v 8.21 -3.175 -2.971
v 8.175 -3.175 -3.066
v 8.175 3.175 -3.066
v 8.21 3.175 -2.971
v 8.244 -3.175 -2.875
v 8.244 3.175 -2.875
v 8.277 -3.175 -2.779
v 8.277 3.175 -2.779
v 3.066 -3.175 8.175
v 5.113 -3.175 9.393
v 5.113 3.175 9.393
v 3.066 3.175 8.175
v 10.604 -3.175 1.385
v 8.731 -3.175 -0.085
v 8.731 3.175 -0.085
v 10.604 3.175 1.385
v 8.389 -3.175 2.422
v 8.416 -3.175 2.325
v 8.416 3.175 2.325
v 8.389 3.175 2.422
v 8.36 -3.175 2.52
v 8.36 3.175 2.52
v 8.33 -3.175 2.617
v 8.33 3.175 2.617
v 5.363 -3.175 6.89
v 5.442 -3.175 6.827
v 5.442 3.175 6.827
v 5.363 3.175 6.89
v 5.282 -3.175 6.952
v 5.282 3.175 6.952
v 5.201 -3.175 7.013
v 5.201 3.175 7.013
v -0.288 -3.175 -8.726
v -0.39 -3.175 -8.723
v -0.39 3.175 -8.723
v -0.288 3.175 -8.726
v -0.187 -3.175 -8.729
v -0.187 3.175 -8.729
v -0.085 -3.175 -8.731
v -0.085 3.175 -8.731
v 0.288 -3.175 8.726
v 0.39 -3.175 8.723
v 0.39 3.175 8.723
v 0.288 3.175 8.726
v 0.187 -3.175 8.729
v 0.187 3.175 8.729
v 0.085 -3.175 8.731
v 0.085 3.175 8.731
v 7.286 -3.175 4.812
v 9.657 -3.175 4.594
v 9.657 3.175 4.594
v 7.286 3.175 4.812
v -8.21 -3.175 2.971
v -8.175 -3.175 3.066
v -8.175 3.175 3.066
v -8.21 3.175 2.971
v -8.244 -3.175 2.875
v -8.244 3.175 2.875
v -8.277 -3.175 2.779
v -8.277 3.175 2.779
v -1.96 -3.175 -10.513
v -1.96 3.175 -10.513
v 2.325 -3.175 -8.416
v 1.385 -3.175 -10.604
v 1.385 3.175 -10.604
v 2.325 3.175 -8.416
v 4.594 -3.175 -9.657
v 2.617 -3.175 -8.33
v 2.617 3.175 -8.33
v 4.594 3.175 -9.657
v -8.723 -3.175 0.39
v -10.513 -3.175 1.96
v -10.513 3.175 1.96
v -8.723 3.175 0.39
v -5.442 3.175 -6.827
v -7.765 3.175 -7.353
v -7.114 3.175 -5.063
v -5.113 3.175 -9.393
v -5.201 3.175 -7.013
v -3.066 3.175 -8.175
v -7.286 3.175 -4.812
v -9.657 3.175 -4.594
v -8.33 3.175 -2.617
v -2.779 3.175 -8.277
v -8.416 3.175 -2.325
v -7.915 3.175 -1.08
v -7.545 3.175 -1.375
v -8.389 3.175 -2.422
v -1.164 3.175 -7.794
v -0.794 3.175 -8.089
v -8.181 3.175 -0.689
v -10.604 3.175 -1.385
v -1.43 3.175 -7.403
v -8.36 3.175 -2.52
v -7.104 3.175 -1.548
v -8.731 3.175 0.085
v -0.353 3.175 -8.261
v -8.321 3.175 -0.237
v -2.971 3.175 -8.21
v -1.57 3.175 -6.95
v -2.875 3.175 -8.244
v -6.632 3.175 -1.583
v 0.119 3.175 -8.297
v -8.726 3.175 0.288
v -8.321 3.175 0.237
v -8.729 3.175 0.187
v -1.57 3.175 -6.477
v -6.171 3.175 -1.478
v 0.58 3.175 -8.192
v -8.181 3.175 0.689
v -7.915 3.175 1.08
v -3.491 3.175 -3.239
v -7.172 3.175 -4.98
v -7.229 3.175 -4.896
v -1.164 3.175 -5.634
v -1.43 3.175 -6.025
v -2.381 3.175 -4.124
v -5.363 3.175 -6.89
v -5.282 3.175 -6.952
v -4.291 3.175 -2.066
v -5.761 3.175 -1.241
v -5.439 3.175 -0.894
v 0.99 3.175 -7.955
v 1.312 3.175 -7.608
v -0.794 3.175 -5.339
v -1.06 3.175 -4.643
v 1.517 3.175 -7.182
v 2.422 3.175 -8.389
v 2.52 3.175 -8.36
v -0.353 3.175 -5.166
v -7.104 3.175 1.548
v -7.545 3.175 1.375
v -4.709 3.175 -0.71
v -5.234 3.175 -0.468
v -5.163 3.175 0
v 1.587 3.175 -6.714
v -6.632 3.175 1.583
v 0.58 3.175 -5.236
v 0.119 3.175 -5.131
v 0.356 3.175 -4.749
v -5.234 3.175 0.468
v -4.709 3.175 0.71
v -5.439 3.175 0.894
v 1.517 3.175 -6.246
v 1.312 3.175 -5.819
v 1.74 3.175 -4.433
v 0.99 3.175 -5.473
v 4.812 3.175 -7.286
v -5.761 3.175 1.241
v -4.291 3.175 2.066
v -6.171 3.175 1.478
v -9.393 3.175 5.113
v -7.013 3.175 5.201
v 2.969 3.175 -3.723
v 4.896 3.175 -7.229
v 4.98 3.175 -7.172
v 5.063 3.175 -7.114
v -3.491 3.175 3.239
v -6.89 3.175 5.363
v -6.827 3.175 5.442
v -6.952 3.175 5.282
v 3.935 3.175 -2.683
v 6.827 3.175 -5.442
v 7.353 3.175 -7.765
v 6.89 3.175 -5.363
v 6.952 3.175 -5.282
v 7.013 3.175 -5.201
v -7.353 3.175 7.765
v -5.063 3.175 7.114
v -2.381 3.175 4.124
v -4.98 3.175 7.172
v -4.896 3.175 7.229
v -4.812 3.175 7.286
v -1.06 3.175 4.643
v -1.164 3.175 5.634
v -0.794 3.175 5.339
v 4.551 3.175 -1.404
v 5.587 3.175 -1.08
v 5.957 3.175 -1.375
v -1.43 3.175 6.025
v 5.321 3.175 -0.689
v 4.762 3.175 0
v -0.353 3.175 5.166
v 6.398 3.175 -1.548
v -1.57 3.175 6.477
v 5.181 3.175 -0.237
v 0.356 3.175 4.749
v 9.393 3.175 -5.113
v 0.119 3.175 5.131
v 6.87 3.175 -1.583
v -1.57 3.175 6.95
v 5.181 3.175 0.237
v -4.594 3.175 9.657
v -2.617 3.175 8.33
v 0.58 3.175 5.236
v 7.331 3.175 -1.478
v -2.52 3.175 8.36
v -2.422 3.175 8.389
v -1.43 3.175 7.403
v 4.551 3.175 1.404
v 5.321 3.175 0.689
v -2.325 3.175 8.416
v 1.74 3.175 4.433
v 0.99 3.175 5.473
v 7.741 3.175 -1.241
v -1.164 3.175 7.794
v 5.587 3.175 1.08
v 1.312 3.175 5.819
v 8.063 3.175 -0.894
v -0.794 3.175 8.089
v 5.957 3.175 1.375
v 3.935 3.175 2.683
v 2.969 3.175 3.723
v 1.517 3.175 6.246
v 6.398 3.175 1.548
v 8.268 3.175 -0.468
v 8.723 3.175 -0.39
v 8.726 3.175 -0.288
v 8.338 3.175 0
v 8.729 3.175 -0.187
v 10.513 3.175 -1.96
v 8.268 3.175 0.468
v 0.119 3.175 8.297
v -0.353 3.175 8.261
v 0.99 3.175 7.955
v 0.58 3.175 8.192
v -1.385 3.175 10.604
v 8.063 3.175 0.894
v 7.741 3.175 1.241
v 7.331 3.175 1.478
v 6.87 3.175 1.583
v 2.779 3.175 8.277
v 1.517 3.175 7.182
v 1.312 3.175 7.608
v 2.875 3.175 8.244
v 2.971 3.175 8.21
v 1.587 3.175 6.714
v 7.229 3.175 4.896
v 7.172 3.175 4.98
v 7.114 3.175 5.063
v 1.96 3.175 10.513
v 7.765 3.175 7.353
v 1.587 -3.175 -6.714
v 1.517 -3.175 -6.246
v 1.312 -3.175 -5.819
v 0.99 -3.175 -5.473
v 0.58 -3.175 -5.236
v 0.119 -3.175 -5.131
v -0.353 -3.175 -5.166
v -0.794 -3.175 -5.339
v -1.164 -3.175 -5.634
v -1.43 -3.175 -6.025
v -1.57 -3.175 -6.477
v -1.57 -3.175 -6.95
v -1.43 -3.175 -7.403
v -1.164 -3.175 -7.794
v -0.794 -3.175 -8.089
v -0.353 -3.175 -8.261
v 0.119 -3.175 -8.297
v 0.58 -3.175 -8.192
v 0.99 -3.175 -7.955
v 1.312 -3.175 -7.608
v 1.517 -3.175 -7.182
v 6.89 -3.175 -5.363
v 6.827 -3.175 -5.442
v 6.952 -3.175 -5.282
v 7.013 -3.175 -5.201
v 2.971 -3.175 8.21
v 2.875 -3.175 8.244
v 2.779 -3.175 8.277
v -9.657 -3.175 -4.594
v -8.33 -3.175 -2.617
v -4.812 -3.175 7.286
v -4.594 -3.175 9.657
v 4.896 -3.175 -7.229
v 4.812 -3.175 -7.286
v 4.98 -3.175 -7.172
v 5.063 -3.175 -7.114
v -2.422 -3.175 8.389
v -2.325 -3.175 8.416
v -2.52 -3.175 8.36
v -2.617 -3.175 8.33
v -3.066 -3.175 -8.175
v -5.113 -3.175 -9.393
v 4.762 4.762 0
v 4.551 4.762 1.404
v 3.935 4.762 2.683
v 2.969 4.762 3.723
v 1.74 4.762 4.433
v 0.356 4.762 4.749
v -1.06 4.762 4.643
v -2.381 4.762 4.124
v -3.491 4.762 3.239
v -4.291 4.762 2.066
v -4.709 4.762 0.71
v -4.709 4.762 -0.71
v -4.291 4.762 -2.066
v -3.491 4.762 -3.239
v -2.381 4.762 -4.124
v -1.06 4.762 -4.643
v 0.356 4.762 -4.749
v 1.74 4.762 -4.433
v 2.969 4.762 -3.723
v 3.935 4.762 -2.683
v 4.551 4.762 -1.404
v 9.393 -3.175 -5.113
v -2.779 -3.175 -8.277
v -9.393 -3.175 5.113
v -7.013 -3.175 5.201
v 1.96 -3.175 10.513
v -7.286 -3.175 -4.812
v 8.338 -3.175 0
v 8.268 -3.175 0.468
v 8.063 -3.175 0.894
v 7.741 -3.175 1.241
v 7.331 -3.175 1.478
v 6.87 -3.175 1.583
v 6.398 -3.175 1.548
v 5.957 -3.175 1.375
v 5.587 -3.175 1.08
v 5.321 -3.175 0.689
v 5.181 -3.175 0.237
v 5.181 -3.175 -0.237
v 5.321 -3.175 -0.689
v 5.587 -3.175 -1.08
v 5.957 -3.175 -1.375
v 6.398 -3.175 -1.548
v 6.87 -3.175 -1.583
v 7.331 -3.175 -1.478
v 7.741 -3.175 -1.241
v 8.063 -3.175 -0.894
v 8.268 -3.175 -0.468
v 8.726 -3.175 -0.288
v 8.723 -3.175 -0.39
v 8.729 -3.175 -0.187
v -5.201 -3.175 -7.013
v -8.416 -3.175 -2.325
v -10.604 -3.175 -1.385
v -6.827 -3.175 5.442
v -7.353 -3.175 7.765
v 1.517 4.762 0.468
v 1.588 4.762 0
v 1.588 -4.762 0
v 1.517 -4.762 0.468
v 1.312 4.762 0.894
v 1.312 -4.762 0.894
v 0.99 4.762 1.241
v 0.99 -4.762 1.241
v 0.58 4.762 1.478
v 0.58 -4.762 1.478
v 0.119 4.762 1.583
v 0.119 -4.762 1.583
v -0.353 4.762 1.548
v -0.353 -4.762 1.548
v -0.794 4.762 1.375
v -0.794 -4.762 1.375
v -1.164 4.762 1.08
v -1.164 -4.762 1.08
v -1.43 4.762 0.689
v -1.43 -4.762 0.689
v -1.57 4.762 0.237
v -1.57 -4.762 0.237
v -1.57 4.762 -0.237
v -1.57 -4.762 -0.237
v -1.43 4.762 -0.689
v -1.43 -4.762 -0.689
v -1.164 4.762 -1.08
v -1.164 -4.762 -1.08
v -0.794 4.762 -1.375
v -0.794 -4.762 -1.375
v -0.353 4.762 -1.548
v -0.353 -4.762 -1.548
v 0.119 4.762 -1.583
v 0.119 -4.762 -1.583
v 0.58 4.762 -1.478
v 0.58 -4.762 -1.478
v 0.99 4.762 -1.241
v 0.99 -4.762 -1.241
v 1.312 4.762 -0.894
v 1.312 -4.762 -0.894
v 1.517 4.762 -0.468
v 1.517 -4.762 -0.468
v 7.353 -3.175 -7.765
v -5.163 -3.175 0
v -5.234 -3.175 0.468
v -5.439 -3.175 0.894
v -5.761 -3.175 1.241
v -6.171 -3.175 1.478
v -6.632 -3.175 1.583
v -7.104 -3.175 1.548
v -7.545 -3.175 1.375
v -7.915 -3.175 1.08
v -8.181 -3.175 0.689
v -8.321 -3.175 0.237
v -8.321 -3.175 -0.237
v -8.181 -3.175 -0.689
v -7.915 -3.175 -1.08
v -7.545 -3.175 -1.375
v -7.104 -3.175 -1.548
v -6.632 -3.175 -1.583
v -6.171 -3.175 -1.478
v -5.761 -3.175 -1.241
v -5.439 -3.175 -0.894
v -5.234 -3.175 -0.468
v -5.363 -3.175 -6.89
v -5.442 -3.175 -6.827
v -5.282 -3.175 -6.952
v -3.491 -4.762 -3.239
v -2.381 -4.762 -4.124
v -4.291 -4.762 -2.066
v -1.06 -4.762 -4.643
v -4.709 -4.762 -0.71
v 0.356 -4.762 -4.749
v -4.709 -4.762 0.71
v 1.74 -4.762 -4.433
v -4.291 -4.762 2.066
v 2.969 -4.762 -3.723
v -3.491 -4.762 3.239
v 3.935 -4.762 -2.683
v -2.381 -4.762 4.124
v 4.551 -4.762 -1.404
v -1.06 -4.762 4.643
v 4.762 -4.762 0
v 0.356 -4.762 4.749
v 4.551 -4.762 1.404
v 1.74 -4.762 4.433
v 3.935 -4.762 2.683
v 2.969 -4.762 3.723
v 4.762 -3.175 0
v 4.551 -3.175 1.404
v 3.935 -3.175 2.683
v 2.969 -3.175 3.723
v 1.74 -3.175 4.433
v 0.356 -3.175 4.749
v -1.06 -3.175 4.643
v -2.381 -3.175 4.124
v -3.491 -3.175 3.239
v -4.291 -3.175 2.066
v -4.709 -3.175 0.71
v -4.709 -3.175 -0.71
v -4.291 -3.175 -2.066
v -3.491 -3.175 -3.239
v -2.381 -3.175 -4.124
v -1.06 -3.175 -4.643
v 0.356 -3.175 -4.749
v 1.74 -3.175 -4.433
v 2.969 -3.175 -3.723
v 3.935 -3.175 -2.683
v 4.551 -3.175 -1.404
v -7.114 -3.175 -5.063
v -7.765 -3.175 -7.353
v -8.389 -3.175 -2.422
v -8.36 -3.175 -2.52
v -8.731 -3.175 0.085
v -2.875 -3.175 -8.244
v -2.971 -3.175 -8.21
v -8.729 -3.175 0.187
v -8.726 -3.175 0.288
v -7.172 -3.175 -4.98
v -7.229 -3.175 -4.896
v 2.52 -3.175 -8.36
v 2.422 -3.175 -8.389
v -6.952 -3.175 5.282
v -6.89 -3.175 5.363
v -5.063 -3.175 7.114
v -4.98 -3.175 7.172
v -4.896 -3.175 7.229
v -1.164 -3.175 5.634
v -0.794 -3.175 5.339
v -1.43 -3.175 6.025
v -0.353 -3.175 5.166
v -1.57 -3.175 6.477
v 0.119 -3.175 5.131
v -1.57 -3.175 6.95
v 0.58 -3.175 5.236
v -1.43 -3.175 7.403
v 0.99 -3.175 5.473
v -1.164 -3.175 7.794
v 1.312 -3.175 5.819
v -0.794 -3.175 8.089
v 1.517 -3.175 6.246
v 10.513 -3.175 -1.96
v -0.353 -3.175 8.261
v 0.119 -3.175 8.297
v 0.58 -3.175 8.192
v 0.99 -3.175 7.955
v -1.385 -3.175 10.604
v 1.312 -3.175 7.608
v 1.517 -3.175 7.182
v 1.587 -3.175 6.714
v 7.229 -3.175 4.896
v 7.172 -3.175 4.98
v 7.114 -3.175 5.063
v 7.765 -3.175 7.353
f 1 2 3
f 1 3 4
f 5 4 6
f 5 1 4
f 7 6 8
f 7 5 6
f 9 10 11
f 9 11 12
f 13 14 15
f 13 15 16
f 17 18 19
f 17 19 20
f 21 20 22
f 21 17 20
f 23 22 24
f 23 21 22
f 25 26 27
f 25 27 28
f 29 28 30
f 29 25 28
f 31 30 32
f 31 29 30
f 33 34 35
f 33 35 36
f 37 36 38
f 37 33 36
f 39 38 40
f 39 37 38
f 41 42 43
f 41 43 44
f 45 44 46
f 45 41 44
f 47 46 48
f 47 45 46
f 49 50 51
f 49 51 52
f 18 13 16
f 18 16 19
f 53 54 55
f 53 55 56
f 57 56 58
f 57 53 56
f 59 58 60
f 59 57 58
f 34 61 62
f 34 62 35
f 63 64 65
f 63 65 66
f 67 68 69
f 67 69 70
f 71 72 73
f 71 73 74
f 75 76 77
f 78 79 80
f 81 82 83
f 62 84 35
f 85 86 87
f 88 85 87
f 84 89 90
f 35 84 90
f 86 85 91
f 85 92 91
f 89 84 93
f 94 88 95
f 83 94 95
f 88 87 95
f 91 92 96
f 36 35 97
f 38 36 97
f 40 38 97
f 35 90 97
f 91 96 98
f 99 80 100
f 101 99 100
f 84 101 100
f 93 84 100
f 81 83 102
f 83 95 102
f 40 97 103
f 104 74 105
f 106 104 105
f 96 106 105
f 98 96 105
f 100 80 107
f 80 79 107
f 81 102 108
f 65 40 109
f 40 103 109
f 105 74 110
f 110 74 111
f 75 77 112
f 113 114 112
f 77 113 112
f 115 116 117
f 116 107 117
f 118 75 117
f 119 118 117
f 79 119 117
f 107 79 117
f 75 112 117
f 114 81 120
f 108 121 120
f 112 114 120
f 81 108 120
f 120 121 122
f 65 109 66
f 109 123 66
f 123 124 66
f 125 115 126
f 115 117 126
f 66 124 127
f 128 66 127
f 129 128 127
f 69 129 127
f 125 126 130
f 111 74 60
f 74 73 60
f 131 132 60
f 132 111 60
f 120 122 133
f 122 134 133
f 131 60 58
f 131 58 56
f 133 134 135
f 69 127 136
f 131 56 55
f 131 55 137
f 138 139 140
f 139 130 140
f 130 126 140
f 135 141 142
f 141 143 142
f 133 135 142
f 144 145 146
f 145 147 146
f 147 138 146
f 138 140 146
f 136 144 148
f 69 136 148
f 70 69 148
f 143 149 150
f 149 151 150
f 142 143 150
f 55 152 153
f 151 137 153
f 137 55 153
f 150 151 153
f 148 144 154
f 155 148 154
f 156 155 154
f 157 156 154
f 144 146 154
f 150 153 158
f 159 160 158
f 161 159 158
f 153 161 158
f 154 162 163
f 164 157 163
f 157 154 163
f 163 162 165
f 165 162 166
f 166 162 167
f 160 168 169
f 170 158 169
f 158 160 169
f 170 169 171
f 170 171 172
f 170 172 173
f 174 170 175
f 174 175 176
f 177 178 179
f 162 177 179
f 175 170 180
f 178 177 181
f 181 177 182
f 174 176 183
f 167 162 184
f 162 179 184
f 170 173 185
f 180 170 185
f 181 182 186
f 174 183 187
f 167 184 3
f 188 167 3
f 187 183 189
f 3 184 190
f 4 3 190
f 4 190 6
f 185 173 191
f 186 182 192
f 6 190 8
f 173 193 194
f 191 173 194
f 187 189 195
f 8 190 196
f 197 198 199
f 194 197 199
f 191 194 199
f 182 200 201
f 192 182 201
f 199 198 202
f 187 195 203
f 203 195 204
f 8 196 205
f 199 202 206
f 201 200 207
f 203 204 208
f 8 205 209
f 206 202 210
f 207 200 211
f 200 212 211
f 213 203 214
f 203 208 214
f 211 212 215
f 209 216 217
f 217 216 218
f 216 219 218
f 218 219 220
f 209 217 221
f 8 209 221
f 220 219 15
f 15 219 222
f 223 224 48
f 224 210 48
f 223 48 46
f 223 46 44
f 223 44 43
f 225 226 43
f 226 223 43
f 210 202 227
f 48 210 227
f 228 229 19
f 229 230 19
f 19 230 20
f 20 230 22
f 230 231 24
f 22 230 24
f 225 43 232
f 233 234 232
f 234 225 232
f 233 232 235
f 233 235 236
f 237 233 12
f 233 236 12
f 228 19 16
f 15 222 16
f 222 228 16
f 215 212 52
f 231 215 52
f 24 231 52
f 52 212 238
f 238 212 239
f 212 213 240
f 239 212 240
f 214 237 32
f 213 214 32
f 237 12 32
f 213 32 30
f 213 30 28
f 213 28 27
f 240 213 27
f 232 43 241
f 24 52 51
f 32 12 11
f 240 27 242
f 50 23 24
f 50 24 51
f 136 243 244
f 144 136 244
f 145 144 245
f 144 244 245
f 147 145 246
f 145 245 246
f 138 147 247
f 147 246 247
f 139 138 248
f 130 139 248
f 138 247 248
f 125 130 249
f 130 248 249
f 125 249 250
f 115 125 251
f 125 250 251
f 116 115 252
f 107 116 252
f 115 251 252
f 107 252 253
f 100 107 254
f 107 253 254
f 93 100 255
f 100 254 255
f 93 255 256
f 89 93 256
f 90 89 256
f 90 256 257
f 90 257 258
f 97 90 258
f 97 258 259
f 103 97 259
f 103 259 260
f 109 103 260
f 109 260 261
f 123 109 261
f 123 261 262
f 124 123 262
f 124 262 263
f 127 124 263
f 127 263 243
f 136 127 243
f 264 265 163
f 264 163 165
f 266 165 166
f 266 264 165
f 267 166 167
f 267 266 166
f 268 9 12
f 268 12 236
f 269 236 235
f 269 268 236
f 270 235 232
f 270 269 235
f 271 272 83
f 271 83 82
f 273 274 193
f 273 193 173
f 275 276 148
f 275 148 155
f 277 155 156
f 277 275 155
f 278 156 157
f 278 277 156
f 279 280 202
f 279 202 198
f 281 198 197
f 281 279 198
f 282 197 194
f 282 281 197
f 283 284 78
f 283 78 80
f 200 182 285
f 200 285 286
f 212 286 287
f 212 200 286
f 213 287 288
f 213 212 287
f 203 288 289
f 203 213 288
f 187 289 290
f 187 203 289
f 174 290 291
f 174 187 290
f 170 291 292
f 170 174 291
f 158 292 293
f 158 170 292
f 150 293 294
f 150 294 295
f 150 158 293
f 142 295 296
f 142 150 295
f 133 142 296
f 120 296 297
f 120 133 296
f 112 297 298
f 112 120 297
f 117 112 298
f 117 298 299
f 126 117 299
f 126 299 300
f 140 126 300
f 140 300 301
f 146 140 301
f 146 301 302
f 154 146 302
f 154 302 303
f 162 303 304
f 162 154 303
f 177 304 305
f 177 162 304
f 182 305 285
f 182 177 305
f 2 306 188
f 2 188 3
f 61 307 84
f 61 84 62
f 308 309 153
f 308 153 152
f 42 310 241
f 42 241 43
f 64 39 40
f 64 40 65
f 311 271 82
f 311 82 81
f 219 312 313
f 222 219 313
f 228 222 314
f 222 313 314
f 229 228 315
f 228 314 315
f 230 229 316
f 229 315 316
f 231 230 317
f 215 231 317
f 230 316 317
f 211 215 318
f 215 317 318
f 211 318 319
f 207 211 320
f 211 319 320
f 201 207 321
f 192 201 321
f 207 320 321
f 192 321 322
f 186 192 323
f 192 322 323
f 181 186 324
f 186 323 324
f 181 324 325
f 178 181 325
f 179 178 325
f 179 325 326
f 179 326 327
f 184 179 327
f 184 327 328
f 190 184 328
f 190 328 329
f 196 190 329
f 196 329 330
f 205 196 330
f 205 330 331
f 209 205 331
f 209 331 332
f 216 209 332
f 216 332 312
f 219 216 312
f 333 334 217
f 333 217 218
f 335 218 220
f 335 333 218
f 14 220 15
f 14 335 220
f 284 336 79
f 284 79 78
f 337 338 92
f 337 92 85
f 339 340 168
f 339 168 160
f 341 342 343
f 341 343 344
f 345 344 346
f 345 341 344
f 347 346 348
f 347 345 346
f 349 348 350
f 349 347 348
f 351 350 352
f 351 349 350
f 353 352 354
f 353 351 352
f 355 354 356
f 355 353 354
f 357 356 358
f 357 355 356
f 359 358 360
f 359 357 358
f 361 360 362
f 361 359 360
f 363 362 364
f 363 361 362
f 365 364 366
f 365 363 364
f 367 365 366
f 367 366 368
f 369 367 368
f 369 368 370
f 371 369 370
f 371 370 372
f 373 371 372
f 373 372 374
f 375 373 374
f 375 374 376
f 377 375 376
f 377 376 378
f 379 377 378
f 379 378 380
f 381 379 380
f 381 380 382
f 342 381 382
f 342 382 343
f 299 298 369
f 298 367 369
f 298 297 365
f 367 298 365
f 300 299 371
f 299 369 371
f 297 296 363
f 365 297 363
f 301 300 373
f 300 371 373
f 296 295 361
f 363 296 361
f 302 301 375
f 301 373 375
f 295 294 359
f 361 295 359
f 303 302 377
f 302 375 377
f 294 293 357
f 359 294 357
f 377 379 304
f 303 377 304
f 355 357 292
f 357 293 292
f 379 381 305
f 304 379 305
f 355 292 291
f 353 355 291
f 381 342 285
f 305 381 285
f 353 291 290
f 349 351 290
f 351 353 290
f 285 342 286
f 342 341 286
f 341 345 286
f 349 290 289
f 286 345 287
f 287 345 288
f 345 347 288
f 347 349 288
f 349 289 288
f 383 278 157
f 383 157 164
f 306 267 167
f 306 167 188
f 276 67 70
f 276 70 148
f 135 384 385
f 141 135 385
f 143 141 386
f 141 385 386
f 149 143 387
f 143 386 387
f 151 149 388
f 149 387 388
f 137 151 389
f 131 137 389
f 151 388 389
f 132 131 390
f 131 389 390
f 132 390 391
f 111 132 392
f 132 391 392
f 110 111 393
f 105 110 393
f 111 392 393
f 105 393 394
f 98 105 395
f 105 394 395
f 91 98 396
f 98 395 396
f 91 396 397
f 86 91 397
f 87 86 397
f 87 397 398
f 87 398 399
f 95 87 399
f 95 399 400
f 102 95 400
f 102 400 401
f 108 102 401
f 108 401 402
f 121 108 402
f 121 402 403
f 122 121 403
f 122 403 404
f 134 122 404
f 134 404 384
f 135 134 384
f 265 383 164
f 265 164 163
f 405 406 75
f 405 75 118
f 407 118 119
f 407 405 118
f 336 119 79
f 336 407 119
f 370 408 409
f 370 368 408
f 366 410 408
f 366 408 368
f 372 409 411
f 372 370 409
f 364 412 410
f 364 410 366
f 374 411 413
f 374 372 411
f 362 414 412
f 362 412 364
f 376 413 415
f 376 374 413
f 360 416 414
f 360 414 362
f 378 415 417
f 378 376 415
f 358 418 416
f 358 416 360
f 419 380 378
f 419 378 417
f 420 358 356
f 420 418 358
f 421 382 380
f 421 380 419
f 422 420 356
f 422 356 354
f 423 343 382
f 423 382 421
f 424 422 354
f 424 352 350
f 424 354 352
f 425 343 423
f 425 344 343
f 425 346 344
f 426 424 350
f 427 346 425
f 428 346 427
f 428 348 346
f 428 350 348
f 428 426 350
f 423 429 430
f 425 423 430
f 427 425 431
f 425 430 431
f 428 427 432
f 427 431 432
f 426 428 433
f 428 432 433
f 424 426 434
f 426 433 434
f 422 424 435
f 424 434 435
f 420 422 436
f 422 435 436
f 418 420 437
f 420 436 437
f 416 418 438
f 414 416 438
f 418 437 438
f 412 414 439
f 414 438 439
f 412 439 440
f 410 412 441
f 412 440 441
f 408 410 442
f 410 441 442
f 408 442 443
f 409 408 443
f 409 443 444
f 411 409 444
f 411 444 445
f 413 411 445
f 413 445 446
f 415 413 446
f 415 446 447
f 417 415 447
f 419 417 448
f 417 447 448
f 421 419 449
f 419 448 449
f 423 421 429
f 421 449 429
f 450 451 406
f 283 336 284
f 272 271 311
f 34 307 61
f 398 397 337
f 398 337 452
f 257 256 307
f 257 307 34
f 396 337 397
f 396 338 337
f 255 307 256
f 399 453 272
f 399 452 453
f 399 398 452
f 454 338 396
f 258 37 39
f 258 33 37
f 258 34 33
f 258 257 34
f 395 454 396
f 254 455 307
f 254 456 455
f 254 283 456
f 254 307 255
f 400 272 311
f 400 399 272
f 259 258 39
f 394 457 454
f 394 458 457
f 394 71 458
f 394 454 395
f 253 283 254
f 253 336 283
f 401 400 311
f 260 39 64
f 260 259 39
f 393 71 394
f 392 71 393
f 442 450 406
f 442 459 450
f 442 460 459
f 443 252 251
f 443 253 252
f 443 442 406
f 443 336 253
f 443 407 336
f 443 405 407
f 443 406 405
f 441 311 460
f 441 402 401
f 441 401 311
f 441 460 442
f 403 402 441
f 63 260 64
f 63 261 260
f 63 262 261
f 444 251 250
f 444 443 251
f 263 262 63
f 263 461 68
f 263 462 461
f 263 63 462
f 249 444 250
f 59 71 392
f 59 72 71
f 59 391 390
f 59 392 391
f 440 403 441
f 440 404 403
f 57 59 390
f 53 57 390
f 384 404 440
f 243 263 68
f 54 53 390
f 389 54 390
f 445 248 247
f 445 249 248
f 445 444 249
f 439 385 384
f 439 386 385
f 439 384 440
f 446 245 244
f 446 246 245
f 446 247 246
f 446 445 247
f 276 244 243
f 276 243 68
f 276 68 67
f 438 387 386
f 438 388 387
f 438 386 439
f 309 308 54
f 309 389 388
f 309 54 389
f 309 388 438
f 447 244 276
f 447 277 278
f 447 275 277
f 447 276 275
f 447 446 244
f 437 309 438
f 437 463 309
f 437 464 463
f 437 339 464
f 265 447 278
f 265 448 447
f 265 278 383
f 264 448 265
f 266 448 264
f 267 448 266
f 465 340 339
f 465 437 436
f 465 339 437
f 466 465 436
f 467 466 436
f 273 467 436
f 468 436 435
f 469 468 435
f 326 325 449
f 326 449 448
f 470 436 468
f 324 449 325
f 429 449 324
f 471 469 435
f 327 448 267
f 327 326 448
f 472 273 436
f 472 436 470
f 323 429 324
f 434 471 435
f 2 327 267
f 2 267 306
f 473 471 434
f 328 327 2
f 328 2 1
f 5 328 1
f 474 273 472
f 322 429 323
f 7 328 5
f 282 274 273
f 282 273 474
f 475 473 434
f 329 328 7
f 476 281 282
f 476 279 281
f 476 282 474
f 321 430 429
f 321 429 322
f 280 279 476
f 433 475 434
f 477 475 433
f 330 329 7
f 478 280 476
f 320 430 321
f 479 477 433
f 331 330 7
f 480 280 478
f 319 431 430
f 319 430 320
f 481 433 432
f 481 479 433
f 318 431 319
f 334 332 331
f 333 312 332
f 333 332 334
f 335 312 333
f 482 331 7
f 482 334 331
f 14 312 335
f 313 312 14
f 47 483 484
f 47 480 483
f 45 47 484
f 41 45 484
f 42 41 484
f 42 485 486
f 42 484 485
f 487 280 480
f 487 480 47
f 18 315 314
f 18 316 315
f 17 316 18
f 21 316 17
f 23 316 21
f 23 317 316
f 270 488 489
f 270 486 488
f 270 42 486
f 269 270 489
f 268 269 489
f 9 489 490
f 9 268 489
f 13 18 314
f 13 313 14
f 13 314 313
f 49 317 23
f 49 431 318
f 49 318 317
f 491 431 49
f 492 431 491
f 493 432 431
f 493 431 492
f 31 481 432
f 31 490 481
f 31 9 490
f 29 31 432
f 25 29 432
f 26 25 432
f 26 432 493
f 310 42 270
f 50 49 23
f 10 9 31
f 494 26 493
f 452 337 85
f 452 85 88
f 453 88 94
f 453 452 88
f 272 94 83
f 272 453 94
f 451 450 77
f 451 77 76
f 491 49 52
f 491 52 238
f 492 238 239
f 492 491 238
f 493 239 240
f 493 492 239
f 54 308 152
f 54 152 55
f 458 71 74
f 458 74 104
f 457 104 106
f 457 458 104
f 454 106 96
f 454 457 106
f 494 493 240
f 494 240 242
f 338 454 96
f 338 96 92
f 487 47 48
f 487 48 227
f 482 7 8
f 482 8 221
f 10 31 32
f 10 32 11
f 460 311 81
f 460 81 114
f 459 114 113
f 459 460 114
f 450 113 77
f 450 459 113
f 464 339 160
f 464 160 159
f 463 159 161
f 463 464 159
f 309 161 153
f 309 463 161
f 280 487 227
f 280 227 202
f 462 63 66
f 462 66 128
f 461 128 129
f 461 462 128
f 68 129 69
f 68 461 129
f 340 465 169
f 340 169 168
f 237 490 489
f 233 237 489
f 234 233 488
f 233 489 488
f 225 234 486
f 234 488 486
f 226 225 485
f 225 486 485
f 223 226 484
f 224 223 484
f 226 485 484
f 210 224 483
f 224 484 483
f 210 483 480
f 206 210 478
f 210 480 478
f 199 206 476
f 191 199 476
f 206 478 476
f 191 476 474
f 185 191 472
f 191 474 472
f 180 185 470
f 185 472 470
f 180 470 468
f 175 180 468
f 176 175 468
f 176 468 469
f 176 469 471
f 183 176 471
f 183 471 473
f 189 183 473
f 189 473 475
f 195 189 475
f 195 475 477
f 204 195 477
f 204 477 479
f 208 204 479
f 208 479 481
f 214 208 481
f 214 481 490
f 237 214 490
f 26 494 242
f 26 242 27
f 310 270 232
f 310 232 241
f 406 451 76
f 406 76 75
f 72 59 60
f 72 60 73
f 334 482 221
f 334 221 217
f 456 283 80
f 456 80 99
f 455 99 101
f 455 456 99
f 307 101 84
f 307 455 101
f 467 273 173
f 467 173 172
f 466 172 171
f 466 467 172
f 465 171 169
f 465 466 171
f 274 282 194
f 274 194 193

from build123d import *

# Parameters (mm, degrees)
F0_R      = 8.73125
F1_DEPTH  = 3.175
F2_R      = 4.7625
F3_DEPTH  = 1.5875
F4_R      = 1.5875
F5_DEPTH  = 7.9385
F6_R      = 1.5875
F7_DEPTH  = 6.351
F10_DEPTH = 6.35
F11_COUNT = 20


with BuildPart() as f1:
    # F0 (on Front) → F1 (new body, symmetric)
    with BuildSketch(Plane.XZ):
        Circle(F0_R)
    extrude(amount=F1_DEPTH, both=True)

    # F2 (on face) → F3 (join)
    with BuildSketch(Plane.XZ.offset(3.175)):
        Circle(F2_R)
    extrude(amount=F3_DEPTH)

    # F4 (on face) → F5 (cut, through all)
    with BuildSketch(Plane.XZ.offset(4.7625)):
        Circle(F4_R)
    extrude(amount=-F5_DEPTH, mode=Mode.SUBTRACT)

    # F6 (on face) → F7 (cut, through all)
    with BuildSketch(Plane.XZ.offset(3.175)):
        with Locations((0, 6.7137391306)):
            Circle(F6_R)
        with Locations((0, -6.7137391306)):
            Circle(F6_R)
        with Locations((-6.750960571, 0)):
            Circle(F6_R)
        with Locations((6.750960571, 0)):
            Circle(F6_R)
    extrude(amount=-F7_DEPTH, mode=Mode.SUBTRACT)

    # F8: F1 across plane


with BuildPart() as f1_1:
    add(f1.part)
    add(f1.part.mirror(Plane.XZ))



with BuildPart() as f10:
    # F9 (on face) → F10 (new body, through all)
    with BuildSketch(Plane.XZ.offset(3.175)):
        with BuildLine():
            Line((-1.3848210597, 10.604101041), (-2.324559949, 8.4161242627))
            ThreePointArc((-2.324559949, 8.4161242627), (-1.1306393797, 8.6577353364), (0.0852877991, 8.7308334398))
            Line((0.0852877991, 8.7308334398), (-1.3848210597, 10.604101041))
        make_face()
    extrude(amount=-F10_DEPTH)


with BuildPart() as f1_2:
    add(f1_1.part)

    add(f10.part)  # F11 merges F10
    # F11: F10 ×20 about axis
    f11_axis = Axis((0, -3.175, 0), (0, -1, 0))
    for i in range(1, F11_COUNT):
        add(f10.part.rotate(f11_axis, i * 360 / F11_COUNT))


solid = f1_2.part
